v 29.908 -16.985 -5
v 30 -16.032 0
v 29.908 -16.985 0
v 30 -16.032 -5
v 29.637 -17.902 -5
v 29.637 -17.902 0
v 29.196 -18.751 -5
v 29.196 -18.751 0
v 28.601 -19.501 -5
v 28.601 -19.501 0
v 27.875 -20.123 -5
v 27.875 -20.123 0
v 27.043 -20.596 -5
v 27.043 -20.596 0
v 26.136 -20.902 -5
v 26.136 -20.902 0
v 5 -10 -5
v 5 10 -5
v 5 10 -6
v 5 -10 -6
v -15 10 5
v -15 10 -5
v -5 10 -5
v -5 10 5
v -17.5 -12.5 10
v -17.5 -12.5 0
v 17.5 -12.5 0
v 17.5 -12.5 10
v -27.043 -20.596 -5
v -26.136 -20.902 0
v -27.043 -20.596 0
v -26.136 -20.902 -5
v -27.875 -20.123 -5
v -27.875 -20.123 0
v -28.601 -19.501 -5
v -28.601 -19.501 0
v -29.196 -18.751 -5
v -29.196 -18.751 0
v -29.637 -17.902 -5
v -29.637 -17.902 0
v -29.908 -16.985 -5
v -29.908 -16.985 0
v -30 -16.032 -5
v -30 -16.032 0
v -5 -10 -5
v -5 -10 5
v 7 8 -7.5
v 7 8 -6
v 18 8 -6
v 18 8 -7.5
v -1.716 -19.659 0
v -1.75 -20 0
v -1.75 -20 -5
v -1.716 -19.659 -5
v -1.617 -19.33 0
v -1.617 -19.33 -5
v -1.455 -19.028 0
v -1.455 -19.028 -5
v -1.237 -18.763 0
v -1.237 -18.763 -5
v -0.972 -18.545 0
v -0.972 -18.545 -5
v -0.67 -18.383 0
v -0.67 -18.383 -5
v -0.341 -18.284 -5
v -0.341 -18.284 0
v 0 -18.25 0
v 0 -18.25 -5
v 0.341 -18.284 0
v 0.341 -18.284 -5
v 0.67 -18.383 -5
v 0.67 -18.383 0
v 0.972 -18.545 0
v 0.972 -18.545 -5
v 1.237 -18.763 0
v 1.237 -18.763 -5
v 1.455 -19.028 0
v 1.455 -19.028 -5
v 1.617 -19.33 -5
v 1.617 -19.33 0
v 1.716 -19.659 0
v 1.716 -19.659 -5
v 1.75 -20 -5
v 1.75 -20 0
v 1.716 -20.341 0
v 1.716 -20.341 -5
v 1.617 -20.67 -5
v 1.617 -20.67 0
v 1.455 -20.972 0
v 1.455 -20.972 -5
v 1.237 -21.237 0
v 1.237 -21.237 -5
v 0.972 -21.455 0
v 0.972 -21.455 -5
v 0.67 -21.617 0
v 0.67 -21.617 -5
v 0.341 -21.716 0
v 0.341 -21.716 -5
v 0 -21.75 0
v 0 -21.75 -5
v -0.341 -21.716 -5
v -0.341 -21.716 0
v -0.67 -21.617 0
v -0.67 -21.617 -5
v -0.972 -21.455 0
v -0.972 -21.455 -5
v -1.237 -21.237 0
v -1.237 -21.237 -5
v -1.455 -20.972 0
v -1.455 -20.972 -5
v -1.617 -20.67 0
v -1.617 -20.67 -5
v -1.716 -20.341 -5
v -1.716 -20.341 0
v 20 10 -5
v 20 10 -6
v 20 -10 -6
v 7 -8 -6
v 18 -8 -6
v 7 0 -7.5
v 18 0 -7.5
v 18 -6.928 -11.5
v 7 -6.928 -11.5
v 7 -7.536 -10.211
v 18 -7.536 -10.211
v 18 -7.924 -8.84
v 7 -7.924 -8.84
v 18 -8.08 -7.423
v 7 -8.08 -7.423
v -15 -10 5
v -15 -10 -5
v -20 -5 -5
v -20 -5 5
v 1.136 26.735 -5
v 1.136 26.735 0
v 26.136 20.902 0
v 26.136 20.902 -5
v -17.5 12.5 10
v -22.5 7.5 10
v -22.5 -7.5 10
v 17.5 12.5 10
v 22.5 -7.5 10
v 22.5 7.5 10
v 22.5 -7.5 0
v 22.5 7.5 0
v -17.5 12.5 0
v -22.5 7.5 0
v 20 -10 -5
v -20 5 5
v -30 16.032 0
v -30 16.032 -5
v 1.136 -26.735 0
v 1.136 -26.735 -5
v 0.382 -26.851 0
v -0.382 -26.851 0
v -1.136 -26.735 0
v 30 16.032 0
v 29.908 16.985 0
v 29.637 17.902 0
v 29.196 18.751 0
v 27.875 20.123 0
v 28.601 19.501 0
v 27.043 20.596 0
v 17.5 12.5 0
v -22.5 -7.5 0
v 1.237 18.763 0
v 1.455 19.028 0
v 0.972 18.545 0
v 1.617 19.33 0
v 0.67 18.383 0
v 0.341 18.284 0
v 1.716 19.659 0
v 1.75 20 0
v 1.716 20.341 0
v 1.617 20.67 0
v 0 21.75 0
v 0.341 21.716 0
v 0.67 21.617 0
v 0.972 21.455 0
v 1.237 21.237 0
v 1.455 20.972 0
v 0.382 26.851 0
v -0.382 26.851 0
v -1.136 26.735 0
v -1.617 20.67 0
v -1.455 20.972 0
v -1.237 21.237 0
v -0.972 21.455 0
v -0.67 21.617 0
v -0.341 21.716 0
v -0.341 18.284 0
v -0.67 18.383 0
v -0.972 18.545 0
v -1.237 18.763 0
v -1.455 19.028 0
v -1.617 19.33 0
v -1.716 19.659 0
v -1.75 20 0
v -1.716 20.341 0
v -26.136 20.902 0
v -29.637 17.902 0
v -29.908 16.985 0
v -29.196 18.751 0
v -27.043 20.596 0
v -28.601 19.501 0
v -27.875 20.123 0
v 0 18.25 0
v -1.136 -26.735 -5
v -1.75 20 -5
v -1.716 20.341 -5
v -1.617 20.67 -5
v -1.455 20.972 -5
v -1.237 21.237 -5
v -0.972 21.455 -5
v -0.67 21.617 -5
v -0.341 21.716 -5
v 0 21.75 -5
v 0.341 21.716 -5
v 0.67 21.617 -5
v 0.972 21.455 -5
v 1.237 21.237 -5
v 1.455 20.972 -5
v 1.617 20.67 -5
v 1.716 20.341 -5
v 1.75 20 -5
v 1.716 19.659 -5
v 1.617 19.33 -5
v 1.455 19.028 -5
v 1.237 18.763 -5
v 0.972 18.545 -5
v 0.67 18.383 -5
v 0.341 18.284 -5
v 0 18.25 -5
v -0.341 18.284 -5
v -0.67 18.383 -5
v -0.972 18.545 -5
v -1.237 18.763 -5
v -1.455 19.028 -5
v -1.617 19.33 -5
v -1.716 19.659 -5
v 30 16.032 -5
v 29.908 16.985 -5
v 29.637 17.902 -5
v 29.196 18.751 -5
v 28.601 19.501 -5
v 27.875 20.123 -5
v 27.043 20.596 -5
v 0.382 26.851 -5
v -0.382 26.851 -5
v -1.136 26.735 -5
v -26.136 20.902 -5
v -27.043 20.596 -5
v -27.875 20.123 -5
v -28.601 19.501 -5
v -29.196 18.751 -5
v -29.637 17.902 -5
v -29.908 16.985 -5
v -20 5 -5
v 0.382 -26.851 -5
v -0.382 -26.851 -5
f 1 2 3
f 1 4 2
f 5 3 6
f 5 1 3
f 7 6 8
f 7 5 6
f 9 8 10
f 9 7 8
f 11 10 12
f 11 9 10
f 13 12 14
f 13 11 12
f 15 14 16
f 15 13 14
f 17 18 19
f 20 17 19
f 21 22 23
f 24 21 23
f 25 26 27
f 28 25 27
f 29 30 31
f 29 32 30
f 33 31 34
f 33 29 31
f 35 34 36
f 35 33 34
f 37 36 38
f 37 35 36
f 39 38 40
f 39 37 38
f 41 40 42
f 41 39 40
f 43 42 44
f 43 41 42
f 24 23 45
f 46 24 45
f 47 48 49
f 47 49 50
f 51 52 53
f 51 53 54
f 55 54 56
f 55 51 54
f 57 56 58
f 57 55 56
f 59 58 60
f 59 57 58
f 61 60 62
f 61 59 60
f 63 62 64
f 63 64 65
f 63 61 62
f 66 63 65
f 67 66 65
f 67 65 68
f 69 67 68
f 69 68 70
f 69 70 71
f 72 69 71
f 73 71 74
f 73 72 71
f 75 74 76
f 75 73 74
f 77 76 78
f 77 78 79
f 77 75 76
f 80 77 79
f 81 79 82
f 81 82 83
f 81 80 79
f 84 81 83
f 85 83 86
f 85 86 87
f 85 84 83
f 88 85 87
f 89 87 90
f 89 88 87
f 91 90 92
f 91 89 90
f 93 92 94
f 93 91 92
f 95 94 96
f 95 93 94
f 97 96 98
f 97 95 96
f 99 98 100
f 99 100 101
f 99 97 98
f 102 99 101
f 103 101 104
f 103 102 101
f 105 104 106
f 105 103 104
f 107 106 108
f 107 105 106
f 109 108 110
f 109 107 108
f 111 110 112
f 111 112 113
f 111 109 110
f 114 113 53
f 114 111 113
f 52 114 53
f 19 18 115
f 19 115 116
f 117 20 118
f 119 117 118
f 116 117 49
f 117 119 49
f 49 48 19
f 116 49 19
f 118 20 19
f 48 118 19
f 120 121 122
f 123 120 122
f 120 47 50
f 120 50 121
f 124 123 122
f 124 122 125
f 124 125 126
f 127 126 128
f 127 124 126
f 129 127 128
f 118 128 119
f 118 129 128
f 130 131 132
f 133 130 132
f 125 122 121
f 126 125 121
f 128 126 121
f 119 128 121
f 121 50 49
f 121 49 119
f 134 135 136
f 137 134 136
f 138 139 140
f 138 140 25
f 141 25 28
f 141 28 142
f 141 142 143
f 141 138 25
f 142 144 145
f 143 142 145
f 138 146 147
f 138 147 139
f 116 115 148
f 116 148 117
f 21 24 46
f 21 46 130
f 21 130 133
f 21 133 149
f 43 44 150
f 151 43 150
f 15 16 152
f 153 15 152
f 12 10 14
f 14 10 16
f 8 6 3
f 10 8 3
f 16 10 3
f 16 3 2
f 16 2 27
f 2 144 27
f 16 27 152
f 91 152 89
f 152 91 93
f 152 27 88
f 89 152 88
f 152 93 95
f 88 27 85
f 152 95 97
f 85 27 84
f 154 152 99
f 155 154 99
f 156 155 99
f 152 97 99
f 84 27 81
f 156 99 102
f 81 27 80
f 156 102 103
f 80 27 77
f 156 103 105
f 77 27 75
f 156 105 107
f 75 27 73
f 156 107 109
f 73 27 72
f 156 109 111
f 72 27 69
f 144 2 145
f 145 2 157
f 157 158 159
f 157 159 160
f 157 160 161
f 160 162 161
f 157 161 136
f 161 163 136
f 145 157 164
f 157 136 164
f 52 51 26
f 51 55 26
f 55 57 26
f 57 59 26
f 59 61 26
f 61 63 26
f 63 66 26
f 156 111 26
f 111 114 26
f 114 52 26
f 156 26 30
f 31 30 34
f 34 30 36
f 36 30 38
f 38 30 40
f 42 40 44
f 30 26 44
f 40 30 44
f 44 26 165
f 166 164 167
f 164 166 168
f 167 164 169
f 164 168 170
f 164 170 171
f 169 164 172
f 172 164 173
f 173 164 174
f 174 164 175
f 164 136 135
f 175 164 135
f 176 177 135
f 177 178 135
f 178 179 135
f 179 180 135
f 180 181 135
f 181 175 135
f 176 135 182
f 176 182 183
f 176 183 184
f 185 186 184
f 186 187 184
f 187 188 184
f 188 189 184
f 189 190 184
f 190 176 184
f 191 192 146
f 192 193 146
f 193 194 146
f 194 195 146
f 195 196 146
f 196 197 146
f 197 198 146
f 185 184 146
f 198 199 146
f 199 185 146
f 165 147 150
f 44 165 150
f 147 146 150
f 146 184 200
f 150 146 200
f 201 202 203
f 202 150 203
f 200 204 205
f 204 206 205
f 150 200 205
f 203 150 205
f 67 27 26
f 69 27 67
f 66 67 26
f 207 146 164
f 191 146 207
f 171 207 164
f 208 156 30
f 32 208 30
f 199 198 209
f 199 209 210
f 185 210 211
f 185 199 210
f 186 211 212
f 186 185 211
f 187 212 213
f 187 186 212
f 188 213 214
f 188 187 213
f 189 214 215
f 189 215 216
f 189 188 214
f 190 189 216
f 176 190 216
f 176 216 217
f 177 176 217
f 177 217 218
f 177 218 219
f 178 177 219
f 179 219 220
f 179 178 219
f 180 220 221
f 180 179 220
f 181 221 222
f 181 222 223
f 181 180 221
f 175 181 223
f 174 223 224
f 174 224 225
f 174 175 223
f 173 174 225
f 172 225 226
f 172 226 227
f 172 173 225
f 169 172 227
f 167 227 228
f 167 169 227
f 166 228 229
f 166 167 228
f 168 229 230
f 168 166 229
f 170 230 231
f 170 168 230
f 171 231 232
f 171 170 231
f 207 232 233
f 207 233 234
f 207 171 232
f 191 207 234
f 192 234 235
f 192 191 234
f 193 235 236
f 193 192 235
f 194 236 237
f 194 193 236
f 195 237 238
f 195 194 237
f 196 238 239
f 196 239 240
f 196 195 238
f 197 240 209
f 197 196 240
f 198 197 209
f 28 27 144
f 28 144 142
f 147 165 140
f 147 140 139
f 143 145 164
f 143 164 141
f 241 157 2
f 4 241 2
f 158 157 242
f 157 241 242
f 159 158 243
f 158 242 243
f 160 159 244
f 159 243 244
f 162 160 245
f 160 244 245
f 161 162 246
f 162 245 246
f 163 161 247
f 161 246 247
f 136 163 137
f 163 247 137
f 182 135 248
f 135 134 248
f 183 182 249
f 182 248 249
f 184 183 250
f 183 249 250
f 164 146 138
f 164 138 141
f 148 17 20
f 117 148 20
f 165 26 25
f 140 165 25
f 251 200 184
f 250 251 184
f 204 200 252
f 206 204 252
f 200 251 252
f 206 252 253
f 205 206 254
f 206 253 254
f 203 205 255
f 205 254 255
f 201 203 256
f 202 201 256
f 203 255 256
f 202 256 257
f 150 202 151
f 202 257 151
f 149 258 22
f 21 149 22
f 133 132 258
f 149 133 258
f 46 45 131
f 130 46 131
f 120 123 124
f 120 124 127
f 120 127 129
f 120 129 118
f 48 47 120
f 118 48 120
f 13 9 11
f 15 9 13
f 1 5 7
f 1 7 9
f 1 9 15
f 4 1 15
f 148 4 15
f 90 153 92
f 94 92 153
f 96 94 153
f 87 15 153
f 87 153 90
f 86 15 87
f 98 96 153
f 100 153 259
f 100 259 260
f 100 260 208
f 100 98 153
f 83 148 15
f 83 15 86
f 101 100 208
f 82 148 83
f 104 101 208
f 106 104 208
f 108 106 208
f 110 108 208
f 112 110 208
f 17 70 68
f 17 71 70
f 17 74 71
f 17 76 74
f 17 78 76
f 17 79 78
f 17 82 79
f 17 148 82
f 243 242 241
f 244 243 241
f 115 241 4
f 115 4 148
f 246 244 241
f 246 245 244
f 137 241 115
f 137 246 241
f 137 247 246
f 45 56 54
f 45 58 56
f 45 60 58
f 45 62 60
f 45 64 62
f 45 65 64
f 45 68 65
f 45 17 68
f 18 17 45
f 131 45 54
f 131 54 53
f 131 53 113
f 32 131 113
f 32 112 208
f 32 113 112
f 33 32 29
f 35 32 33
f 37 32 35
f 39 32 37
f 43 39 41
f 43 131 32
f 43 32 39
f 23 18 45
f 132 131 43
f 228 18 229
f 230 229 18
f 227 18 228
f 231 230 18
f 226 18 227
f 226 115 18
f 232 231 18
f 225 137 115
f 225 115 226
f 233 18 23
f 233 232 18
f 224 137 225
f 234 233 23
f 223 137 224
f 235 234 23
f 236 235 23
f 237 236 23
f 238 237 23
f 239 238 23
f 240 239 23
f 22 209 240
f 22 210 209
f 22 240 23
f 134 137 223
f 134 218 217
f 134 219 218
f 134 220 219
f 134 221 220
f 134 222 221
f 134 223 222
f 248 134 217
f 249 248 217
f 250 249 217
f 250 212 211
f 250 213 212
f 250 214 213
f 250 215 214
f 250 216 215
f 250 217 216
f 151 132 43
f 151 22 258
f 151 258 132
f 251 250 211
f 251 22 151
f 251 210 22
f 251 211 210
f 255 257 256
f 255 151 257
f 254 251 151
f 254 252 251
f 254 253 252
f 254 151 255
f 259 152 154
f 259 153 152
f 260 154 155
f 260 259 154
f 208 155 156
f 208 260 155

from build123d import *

# Parameters (mm, degrees)
SKETCH1_W           = 45
SKETCH1_H           = 25
BOSS_EXTRUDE1_DEPTH = 10
SKETCH2_R           = 1.75
BOSS_EXTRUDE2_DEPTH = 5
FILLET1_R           = 5
CUT_EXTRUDE1_DEPTH  = 10
SKETCH4_W           = 1
SKETCH4_H           = 20
BOSS_EXTRUDE3_DEPTH = 15
BOSS_EXTRUDE4_DEPTH = 11
CHAMFER1_SIZE       = 5


with BuildPart() as part:
    # Sketch1 → Boss-Extrude1 (new body)
    with BuildSketch(Plane.XY):
        Rectangle(SKETCH1_W, SKETCH1_H)
    extrude(amount=BOSS_EXTRUDE1_DEPTH)

    # Sketch2 → Boss-Extrude2 (add)
    with BuildSketch(Plane(origin=(0, 0, 0), x_dir=(-1, 0, 0), z_dir=(0, 0, -1))):
        Polygon((-30, 20), (-30, -20), (0, -27), (30, -20), (30, 20), (0, 27), align=None)
        with Locations((0, 20)):
            Circle(SKETCH2_R, mode=Mode.SUBTRACT)
        with Locations((0, -20)):
            Circle(SKETCH2_R, mode=Mode.SUBTRACT)
    extrude(amount=BOSS_EXTRUDE2_DEPTH)

    # Fillet1
    fillet1_edges = [part.edges().sort_by_distance(p)[0] for p in [
        (0, -27, -2.5),
        (-30, -20, -2.5),
        (-30, 20, -2.5),
        (0, 27, -2.5),
        (30, 20, -2.5),
        (30, -20, -2.5),
    ]]
    fillet(fillet1_edges, radius=FILLET1_R)

    # Sketch3 → Cut-Extrude1 (cut)
    with BuildSketch(Plane(origin=(0, 0, -5), x_dir=(-1, 0, 0), z_dir=(0, 0, -1))):
        Polygon((5, 10), (5, -10), (15, -10), (20, -5), (20, 5), (15, 10), align=None)
    extrude(amount=-CUT_EXTRUDE1_DEPTH, mode=Mode.SUBTRACT)

    # Sketch4 → Boss-Extrude3 (add)
    with BuildSketch(Plane(origin=(5, 0, 0), x_dir=(0, 0, -1), z_dir=(1, 0, 0))):
        with Locations((5.5, 0)):
            Rectangle(SKETCH4_W, SKETCH4_H)
    extrude(amount=BOSS_EXTRUDE3_DEPTH)

    # Sketch5 → Boss-Extrude4 (add)
    with BuildSketch(Plane(origin=(7, 0, 0), x_dir=(0, 0, -1), z_dir=(1, 0, 0))):
        with BuildLine():
            Line((6, 8), (7.5, 8))
            Line((7.5, 8), (7.5, 0))
            Line((7.5, 0), (11.5, -6.92820323))
            ThreePointArc((11.5, -6.92820323), (8.839548107, -7.923623984), (6, -8))
            Line((6, -8), (6, 8))
        make_face()
    extrude(amount=BOSS_EXTRUDE4_DEPTH)

    # Chamfer1
    chamfer1_edges = [part.edges().sort_by_distance(p)[0] for p in [
        (22.5, -12.5, 5),
        (-22.5, -12.5, 5),
        (-22.5, 12.5, 5),
        (22.5, 12.5, 5),
    ]]
    chamfer(chamfer1_edges, length=CHAMFER1_SIZE)


solid = part.part
